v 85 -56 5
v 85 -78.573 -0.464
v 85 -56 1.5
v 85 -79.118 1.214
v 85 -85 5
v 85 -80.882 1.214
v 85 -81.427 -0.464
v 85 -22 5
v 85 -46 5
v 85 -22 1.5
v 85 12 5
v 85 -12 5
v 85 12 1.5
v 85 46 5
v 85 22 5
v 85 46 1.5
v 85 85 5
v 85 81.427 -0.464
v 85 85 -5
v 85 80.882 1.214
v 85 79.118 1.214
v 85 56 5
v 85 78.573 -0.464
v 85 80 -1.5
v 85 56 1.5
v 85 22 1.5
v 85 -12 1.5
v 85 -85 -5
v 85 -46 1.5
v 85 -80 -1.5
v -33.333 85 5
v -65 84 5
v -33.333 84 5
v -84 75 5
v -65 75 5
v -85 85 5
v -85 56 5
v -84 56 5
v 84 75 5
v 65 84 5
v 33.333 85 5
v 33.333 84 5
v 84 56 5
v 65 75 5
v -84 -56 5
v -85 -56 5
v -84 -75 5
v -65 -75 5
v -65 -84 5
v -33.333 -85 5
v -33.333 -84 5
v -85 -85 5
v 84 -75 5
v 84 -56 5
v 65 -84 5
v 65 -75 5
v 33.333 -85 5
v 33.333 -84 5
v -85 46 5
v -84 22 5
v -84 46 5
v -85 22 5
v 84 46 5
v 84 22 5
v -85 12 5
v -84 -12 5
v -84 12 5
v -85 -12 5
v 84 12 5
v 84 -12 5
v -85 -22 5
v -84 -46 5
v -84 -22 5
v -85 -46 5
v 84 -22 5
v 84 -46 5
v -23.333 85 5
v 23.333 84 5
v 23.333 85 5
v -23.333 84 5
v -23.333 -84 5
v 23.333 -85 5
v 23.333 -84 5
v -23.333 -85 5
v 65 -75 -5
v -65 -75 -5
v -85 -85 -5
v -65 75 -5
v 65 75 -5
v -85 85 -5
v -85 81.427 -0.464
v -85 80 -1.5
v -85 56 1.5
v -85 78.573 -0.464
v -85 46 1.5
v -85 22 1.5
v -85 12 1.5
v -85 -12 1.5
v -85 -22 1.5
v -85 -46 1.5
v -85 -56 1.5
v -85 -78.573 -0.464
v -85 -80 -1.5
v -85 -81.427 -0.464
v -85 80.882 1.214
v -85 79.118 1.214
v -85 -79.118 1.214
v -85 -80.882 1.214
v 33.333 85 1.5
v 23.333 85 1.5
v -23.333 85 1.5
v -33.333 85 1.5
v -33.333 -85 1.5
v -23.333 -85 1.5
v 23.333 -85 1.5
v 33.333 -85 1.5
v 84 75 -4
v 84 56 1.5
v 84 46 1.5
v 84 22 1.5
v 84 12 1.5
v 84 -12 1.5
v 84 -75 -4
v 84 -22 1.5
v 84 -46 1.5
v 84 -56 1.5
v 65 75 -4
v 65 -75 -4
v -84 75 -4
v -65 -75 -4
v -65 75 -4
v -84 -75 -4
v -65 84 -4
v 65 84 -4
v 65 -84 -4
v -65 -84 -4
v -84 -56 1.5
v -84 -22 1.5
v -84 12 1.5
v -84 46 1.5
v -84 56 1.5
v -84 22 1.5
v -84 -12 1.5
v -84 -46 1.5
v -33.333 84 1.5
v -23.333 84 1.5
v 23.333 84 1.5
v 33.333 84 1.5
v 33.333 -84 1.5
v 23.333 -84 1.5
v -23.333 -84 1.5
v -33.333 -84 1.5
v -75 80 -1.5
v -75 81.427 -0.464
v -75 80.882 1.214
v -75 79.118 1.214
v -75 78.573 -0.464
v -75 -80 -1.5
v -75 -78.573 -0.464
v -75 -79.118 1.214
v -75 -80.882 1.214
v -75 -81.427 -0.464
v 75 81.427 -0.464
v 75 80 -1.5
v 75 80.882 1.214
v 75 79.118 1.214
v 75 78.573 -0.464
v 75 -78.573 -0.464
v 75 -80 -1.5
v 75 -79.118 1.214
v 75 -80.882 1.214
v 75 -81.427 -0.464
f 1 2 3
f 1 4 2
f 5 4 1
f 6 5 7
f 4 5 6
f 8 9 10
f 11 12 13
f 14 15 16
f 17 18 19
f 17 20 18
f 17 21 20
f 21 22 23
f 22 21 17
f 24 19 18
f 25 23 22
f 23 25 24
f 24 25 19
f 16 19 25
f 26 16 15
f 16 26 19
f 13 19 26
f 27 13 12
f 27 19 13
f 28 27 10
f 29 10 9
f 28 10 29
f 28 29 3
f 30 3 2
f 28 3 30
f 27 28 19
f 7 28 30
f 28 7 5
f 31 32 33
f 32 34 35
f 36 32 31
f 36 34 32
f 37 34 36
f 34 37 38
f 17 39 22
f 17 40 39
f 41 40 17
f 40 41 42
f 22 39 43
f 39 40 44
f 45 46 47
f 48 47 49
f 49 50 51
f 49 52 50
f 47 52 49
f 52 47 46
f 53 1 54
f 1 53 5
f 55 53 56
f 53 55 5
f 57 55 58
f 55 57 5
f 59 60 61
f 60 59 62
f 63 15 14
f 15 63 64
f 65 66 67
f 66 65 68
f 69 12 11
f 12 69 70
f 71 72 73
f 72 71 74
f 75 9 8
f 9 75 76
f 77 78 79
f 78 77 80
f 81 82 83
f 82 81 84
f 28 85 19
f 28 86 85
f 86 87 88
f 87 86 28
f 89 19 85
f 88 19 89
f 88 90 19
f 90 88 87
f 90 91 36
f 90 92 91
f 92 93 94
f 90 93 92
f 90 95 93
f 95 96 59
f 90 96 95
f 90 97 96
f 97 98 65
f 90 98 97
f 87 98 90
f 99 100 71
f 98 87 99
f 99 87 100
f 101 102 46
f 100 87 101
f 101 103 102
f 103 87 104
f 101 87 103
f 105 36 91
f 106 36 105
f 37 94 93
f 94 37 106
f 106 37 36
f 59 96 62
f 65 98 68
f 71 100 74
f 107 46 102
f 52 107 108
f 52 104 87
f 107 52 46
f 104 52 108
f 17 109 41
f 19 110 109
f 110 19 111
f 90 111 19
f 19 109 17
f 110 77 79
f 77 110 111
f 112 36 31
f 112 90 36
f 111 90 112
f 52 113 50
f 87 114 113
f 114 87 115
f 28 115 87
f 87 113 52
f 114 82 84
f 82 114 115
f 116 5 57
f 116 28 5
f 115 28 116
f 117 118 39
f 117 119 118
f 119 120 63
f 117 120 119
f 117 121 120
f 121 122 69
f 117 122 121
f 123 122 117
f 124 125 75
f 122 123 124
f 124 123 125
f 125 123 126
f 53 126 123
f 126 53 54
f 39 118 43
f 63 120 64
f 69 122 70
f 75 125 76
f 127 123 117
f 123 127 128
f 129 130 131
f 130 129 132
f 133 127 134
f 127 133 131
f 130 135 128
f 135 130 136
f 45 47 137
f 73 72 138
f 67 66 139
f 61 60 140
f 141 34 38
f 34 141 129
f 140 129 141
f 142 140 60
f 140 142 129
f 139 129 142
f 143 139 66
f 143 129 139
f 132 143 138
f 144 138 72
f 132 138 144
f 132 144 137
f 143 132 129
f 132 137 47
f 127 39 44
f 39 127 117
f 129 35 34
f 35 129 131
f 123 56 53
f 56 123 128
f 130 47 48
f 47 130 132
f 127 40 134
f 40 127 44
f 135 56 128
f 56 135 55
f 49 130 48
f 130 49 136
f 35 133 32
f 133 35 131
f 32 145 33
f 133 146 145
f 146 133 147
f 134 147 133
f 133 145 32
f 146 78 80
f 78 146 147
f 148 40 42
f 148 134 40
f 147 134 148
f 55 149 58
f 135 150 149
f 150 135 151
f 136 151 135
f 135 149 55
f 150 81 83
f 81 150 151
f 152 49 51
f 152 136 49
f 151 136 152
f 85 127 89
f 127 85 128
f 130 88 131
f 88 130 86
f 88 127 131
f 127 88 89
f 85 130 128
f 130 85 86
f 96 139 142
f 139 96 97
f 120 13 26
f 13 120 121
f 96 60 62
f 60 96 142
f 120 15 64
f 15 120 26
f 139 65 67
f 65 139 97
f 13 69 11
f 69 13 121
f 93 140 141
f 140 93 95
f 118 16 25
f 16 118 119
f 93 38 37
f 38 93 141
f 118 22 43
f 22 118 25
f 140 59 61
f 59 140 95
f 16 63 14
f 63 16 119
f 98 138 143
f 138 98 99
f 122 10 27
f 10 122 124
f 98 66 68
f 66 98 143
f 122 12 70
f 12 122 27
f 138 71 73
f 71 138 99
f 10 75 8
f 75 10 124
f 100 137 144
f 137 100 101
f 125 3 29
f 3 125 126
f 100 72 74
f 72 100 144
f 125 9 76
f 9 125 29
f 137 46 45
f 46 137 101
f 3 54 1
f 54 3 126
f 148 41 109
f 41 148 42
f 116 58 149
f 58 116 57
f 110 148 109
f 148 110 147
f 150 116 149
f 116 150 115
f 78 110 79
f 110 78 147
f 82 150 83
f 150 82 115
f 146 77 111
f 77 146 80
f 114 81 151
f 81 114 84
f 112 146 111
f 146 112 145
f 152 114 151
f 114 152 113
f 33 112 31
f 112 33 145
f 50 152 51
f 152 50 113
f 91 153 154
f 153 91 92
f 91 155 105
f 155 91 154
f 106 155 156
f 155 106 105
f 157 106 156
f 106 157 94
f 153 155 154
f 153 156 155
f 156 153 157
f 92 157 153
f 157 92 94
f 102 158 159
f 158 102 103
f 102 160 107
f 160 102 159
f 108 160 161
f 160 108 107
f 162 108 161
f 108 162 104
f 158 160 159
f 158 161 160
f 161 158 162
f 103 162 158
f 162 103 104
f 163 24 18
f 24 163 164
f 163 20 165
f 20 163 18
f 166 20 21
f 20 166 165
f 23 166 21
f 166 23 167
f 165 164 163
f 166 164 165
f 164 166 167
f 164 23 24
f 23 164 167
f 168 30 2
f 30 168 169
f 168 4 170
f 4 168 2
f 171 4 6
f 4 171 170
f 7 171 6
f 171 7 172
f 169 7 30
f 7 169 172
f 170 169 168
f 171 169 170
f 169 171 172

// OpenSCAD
difference() {
    wall=1; //1.6
    
    cube([170,170,10], center=true);
    translate([0,0,wall]) cube([170-wall*2,150,10], center=true);
    translate([0,0,wall]) cube([130,170-wall*2,10], center=true);
    translate([0,0,0]) cube([130,150,15], center=true);
    
    translate([0,17,4]) cube([171,10,5], center=true);
    translate([0,17+34,4]) cube([171,10,5], center=true);
    translate([0,-17,4]) cube([171,10,5], center=true);
    translate([0,-17-34,4]) cube([171,10,5], center=true);
    translate([170/6,0,4]) cube([10,171,5], center=true);
    translate([-170/6,0,4]) cube([10,171,5], center=true);
    
    translate([-170/2,170/2-5,0])
        rotate([0,90,0]) cylinder(h=20,r=1.5,center=true);
    translate([-170/2,-170/2+5,0])
        rotate([0,90,0]) cylinder(h=20,r=1.5,center=true);
    translate([170/2,170/2-5,0])
        rotate([0,90,0]) cylinder(h=20,r=1.5,center=true);
    translate([170/2,-170/2+5,0])
        rotate([0,90,0]) cylinder(h=20,r=1.5,center=true);
}
